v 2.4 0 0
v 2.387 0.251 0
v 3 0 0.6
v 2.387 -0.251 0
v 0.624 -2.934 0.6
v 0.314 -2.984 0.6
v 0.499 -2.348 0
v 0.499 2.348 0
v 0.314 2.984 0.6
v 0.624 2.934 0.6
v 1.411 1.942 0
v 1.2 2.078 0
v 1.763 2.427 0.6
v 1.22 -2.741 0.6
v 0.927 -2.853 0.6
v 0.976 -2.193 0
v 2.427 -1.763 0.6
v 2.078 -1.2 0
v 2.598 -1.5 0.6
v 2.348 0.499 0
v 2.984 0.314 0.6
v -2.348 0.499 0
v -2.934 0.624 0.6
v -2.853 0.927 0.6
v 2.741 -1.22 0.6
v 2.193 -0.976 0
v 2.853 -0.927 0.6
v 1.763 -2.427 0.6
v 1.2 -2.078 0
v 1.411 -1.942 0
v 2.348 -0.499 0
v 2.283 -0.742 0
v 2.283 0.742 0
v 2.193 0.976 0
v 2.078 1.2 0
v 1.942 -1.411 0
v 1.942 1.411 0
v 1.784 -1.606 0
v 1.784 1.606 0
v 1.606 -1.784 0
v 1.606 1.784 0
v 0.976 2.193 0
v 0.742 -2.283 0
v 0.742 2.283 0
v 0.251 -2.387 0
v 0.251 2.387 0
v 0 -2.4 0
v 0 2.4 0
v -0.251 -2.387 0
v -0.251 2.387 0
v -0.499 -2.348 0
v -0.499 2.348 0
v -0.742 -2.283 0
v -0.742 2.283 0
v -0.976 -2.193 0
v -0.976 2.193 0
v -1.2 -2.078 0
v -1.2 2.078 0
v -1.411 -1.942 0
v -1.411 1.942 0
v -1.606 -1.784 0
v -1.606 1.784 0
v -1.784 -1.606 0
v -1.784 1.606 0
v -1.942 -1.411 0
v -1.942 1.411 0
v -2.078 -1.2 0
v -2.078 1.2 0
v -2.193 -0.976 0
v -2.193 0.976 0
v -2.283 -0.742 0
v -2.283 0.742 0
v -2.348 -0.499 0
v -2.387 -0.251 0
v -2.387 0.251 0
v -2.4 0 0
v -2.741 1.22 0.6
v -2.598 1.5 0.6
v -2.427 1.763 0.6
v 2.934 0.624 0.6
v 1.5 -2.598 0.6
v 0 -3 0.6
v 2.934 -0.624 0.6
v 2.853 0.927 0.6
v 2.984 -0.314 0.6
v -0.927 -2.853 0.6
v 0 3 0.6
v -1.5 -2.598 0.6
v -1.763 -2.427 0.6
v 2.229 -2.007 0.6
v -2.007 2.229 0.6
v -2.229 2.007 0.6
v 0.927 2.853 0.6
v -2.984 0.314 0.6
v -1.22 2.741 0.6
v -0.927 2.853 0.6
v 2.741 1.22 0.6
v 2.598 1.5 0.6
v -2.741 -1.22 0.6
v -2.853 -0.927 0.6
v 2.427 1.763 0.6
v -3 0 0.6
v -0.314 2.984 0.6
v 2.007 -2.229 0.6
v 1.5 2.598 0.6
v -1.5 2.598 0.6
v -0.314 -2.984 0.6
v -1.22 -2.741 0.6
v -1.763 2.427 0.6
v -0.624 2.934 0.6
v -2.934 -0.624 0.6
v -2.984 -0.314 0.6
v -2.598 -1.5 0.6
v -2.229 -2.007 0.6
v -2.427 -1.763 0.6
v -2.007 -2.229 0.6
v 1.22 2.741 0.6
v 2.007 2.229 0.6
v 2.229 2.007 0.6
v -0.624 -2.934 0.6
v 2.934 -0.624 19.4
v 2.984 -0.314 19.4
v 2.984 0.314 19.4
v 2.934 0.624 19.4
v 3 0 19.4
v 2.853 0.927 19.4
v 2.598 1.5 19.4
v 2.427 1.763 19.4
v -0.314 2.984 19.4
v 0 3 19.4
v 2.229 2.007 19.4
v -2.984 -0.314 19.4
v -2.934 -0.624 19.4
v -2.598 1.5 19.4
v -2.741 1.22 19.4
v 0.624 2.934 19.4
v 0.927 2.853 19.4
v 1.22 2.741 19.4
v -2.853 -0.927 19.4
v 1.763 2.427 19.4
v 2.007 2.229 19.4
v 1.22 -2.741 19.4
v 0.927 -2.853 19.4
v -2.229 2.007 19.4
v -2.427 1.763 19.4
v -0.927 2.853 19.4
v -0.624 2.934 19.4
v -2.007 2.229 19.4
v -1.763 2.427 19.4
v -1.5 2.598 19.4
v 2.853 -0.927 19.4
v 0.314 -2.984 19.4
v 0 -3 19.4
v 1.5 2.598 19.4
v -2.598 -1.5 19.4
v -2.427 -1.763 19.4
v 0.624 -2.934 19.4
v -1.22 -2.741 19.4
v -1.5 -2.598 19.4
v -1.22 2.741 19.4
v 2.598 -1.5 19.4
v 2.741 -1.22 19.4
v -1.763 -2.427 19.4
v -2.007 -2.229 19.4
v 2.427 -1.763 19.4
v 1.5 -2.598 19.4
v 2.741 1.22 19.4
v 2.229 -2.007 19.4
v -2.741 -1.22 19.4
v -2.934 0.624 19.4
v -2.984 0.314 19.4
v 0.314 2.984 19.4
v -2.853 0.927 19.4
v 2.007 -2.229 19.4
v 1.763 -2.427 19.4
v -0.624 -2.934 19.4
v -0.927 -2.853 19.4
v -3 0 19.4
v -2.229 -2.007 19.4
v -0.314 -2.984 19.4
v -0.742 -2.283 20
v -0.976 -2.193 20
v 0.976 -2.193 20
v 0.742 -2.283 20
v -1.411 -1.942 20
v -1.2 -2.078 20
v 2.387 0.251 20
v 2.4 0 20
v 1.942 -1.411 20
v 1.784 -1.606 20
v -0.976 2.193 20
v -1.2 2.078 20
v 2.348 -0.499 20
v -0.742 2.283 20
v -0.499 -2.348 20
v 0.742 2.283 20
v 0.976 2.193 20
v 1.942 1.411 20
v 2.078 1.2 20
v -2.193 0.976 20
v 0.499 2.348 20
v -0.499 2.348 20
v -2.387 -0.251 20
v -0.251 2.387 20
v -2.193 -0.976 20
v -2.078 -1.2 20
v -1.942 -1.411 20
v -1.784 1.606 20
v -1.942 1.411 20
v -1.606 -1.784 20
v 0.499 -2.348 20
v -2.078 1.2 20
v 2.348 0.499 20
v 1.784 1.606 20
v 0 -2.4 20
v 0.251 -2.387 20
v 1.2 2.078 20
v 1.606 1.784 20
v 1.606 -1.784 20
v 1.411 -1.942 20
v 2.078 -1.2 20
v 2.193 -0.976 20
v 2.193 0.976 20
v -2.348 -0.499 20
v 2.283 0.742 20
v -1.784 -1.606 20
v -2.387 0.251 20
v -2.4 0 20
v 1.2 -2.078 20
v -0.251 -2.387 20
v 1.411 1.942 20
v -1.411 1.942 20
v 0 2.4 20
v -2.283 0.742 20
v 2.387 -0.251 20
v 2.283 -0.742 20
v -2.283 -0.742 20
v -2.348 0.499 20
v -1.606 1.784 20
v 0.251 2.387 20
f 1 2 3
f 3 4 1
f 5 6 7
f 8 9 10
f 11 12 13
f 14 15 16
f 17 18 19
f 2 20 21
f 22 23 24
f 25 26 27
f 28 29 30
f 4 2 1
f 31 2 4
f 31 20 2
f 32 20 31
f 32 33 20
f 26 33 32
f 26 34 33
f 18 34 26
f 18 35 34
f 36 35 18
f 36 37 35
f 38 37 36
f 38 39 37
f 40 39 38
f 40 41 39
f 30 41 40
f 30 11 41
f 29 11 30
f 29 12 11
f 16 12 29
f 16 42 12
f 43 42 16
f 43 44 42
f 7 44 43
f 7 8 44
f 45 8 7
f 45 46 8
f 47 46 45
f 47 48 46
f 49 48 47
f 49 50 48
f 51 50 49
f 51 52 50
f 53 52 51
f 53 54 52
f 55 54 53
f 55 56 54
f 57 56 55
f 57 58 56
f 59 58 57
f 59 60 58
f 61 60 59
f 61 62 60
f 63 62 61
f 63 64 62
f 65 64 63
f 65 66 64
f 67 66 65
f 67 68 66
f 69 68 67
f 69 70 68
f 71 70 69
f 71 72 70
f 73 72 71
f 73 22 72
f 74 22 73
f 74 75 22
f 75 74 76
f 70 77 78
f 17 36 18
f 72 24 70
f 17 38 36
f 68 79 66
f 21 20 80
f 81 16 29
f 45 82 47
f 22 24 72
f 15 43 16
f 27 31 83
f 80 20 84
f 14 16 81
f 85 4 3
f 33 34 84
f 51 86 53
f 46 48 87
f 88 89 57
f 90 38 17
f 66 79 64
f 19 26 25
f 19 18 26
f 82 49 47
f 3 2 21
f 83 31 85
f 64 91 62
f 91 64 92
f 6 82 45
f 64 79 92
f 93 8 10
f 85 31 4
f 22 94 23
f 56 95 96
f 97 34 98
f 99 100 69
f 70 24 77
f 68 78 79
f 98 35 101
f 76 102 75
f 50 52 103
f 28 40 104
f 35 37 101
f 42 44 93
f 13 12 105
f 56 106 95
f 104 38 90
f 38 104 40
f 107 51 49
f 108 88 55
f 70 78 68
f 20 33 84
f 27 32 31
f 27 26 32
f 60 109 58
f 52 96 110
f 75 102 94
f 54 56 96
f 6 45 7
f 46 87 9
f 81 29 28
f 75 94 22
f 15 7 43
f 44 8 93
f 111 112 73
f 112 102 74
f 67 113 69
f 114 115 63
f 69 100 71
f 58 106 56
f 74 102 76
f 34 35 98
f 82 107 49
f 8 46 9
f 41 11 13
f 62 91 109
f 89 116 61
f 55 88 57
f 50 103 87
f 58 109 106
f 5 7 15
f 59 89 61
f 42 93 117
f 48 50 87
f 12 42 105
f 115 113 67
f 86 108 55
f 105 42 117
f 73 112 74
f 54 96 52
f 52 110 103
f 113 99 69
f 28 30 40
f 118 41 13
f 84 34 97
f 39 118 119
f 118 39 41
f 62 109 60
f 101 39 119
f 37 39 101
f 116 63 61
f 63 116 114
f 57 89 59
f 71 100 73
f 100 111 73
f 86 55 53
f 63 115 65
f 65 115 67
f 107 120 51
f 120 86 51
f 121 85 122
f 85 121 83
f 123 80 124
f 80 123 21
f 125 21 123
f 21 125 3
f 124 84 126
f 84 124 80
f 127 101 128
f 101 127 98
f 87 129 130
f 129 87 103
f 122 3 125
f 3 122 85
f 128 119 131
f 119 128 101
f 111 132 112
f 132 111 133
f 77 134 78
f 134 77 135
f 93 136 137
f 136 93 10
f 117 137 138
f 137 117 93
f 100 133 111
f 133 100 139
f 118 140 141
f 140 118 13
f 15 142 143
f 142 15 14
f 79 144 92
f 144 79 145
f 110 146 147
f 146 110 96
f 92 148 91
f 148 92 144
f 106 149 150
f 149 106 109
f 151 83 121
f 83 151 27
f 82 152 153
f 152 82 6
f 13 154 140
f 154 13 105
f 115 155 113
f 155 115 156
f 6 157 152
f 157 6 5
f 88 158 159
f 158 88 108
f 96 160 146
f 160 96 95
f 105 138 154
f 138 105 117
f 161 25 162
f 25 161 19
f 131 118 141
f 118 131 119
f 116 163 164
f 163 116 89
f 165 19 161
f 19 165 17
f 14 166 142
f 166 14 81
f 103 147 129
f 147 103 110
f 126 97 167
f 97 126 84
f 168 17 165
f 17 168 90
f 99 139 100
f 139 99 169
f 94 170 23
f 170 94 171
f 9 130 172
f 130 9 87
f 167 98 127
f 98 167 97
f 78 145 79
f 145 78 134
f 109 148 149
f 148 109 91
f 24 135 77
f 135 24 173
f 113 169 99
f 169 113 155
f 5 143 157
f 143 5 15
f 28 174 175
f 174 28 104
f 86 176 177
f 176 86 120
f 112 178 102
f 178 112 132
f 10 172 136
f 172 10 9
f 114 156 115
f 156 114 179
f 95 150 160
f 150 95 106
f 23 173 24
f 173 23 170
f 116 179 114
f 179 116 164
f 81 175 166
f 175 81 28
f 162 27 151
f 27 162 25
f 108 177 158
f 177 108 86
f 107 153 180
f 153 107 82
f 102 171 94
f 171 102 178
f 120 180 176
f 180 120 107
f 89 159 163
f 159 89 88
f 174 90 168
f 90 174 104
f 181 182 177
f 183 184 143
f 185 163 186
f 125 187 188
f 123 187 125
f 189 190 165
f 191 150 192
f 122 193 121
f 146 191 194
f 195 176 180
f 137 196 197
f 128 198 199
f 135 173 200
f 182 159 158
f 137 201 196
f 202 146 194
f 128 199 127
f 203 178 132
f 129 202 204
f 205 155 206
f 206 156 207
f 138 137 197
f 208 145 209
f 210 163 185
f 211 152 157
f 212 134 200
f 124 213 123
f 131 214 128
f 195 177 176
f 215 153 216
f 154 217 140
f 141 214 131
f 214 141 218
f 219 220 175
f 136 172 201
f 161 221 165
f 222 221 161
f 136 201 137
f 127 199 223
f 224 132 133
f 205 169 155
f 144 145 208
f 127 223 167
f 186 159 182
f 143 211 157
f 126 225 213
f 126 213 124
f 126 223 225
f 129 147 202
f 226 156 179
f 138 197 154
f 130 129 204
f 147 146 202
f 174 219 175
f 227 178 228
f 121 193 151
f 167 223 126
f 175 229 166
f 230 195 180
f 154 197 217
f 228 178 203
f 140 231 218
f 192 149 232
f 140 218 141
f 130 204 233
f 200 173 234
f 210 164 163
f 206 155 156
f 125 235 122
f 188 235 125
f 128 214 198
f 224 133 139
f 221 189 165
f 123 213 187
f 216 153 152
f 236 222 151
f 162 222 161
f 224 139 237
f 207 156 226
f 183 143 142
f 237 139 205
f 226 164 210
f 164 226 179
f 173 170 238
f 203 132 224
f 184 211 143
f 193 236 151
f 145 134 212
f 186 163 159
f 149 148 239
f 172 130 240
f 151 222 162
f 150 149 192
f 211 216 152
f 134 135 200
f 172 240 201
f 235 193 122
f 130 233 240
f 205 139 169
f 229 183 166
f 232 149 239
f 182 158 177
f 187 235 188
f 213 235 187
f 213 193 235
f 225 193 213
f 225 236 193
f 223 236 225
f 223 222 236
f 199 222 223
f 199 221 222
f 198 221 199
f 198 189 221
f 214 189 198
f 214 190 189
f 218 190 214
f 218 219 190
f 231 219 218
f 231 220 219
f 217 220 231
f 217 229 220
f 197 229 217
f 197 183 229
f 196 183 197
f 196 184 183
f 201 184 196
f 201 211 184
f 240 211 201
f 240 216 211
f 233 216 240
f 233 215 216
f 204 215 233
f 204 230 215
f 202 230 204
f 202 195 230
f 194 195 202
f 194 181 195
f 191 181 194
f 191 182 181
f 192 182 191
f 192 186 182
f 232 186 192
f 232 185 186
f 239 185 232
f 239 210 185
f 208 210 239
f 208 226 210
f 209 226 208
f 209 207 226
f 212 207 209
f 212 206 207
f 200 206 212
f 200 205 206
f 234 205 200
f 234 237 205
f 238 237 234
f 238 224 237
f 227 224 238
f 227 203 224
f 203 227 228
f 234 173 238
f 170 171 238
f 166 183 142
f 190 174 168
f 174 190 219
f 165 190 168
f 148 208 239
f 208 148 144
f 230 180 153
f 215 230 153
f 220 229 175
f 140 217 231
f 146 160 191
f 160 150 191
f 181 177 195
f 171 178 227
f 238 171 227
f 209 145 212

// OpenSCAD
// Chamfered dowel pin.
$fn = 60;
eps = 0.02;
diameter = 6;
length = 20;
chamfer = 0.6;
union() {
    cylinder(d1 = diameter - 2 * chamfer, d2 = diameter, h = chamfer);
    translate([0, 0, chamfer]) cylinder(d = diameter, h = length - 2 * chamfer);
    translate([0, 0, length - chamfer]) cylinder(d1 = diameter, d2 = diameter - 2 * chamfer, h = chamfer);
}
